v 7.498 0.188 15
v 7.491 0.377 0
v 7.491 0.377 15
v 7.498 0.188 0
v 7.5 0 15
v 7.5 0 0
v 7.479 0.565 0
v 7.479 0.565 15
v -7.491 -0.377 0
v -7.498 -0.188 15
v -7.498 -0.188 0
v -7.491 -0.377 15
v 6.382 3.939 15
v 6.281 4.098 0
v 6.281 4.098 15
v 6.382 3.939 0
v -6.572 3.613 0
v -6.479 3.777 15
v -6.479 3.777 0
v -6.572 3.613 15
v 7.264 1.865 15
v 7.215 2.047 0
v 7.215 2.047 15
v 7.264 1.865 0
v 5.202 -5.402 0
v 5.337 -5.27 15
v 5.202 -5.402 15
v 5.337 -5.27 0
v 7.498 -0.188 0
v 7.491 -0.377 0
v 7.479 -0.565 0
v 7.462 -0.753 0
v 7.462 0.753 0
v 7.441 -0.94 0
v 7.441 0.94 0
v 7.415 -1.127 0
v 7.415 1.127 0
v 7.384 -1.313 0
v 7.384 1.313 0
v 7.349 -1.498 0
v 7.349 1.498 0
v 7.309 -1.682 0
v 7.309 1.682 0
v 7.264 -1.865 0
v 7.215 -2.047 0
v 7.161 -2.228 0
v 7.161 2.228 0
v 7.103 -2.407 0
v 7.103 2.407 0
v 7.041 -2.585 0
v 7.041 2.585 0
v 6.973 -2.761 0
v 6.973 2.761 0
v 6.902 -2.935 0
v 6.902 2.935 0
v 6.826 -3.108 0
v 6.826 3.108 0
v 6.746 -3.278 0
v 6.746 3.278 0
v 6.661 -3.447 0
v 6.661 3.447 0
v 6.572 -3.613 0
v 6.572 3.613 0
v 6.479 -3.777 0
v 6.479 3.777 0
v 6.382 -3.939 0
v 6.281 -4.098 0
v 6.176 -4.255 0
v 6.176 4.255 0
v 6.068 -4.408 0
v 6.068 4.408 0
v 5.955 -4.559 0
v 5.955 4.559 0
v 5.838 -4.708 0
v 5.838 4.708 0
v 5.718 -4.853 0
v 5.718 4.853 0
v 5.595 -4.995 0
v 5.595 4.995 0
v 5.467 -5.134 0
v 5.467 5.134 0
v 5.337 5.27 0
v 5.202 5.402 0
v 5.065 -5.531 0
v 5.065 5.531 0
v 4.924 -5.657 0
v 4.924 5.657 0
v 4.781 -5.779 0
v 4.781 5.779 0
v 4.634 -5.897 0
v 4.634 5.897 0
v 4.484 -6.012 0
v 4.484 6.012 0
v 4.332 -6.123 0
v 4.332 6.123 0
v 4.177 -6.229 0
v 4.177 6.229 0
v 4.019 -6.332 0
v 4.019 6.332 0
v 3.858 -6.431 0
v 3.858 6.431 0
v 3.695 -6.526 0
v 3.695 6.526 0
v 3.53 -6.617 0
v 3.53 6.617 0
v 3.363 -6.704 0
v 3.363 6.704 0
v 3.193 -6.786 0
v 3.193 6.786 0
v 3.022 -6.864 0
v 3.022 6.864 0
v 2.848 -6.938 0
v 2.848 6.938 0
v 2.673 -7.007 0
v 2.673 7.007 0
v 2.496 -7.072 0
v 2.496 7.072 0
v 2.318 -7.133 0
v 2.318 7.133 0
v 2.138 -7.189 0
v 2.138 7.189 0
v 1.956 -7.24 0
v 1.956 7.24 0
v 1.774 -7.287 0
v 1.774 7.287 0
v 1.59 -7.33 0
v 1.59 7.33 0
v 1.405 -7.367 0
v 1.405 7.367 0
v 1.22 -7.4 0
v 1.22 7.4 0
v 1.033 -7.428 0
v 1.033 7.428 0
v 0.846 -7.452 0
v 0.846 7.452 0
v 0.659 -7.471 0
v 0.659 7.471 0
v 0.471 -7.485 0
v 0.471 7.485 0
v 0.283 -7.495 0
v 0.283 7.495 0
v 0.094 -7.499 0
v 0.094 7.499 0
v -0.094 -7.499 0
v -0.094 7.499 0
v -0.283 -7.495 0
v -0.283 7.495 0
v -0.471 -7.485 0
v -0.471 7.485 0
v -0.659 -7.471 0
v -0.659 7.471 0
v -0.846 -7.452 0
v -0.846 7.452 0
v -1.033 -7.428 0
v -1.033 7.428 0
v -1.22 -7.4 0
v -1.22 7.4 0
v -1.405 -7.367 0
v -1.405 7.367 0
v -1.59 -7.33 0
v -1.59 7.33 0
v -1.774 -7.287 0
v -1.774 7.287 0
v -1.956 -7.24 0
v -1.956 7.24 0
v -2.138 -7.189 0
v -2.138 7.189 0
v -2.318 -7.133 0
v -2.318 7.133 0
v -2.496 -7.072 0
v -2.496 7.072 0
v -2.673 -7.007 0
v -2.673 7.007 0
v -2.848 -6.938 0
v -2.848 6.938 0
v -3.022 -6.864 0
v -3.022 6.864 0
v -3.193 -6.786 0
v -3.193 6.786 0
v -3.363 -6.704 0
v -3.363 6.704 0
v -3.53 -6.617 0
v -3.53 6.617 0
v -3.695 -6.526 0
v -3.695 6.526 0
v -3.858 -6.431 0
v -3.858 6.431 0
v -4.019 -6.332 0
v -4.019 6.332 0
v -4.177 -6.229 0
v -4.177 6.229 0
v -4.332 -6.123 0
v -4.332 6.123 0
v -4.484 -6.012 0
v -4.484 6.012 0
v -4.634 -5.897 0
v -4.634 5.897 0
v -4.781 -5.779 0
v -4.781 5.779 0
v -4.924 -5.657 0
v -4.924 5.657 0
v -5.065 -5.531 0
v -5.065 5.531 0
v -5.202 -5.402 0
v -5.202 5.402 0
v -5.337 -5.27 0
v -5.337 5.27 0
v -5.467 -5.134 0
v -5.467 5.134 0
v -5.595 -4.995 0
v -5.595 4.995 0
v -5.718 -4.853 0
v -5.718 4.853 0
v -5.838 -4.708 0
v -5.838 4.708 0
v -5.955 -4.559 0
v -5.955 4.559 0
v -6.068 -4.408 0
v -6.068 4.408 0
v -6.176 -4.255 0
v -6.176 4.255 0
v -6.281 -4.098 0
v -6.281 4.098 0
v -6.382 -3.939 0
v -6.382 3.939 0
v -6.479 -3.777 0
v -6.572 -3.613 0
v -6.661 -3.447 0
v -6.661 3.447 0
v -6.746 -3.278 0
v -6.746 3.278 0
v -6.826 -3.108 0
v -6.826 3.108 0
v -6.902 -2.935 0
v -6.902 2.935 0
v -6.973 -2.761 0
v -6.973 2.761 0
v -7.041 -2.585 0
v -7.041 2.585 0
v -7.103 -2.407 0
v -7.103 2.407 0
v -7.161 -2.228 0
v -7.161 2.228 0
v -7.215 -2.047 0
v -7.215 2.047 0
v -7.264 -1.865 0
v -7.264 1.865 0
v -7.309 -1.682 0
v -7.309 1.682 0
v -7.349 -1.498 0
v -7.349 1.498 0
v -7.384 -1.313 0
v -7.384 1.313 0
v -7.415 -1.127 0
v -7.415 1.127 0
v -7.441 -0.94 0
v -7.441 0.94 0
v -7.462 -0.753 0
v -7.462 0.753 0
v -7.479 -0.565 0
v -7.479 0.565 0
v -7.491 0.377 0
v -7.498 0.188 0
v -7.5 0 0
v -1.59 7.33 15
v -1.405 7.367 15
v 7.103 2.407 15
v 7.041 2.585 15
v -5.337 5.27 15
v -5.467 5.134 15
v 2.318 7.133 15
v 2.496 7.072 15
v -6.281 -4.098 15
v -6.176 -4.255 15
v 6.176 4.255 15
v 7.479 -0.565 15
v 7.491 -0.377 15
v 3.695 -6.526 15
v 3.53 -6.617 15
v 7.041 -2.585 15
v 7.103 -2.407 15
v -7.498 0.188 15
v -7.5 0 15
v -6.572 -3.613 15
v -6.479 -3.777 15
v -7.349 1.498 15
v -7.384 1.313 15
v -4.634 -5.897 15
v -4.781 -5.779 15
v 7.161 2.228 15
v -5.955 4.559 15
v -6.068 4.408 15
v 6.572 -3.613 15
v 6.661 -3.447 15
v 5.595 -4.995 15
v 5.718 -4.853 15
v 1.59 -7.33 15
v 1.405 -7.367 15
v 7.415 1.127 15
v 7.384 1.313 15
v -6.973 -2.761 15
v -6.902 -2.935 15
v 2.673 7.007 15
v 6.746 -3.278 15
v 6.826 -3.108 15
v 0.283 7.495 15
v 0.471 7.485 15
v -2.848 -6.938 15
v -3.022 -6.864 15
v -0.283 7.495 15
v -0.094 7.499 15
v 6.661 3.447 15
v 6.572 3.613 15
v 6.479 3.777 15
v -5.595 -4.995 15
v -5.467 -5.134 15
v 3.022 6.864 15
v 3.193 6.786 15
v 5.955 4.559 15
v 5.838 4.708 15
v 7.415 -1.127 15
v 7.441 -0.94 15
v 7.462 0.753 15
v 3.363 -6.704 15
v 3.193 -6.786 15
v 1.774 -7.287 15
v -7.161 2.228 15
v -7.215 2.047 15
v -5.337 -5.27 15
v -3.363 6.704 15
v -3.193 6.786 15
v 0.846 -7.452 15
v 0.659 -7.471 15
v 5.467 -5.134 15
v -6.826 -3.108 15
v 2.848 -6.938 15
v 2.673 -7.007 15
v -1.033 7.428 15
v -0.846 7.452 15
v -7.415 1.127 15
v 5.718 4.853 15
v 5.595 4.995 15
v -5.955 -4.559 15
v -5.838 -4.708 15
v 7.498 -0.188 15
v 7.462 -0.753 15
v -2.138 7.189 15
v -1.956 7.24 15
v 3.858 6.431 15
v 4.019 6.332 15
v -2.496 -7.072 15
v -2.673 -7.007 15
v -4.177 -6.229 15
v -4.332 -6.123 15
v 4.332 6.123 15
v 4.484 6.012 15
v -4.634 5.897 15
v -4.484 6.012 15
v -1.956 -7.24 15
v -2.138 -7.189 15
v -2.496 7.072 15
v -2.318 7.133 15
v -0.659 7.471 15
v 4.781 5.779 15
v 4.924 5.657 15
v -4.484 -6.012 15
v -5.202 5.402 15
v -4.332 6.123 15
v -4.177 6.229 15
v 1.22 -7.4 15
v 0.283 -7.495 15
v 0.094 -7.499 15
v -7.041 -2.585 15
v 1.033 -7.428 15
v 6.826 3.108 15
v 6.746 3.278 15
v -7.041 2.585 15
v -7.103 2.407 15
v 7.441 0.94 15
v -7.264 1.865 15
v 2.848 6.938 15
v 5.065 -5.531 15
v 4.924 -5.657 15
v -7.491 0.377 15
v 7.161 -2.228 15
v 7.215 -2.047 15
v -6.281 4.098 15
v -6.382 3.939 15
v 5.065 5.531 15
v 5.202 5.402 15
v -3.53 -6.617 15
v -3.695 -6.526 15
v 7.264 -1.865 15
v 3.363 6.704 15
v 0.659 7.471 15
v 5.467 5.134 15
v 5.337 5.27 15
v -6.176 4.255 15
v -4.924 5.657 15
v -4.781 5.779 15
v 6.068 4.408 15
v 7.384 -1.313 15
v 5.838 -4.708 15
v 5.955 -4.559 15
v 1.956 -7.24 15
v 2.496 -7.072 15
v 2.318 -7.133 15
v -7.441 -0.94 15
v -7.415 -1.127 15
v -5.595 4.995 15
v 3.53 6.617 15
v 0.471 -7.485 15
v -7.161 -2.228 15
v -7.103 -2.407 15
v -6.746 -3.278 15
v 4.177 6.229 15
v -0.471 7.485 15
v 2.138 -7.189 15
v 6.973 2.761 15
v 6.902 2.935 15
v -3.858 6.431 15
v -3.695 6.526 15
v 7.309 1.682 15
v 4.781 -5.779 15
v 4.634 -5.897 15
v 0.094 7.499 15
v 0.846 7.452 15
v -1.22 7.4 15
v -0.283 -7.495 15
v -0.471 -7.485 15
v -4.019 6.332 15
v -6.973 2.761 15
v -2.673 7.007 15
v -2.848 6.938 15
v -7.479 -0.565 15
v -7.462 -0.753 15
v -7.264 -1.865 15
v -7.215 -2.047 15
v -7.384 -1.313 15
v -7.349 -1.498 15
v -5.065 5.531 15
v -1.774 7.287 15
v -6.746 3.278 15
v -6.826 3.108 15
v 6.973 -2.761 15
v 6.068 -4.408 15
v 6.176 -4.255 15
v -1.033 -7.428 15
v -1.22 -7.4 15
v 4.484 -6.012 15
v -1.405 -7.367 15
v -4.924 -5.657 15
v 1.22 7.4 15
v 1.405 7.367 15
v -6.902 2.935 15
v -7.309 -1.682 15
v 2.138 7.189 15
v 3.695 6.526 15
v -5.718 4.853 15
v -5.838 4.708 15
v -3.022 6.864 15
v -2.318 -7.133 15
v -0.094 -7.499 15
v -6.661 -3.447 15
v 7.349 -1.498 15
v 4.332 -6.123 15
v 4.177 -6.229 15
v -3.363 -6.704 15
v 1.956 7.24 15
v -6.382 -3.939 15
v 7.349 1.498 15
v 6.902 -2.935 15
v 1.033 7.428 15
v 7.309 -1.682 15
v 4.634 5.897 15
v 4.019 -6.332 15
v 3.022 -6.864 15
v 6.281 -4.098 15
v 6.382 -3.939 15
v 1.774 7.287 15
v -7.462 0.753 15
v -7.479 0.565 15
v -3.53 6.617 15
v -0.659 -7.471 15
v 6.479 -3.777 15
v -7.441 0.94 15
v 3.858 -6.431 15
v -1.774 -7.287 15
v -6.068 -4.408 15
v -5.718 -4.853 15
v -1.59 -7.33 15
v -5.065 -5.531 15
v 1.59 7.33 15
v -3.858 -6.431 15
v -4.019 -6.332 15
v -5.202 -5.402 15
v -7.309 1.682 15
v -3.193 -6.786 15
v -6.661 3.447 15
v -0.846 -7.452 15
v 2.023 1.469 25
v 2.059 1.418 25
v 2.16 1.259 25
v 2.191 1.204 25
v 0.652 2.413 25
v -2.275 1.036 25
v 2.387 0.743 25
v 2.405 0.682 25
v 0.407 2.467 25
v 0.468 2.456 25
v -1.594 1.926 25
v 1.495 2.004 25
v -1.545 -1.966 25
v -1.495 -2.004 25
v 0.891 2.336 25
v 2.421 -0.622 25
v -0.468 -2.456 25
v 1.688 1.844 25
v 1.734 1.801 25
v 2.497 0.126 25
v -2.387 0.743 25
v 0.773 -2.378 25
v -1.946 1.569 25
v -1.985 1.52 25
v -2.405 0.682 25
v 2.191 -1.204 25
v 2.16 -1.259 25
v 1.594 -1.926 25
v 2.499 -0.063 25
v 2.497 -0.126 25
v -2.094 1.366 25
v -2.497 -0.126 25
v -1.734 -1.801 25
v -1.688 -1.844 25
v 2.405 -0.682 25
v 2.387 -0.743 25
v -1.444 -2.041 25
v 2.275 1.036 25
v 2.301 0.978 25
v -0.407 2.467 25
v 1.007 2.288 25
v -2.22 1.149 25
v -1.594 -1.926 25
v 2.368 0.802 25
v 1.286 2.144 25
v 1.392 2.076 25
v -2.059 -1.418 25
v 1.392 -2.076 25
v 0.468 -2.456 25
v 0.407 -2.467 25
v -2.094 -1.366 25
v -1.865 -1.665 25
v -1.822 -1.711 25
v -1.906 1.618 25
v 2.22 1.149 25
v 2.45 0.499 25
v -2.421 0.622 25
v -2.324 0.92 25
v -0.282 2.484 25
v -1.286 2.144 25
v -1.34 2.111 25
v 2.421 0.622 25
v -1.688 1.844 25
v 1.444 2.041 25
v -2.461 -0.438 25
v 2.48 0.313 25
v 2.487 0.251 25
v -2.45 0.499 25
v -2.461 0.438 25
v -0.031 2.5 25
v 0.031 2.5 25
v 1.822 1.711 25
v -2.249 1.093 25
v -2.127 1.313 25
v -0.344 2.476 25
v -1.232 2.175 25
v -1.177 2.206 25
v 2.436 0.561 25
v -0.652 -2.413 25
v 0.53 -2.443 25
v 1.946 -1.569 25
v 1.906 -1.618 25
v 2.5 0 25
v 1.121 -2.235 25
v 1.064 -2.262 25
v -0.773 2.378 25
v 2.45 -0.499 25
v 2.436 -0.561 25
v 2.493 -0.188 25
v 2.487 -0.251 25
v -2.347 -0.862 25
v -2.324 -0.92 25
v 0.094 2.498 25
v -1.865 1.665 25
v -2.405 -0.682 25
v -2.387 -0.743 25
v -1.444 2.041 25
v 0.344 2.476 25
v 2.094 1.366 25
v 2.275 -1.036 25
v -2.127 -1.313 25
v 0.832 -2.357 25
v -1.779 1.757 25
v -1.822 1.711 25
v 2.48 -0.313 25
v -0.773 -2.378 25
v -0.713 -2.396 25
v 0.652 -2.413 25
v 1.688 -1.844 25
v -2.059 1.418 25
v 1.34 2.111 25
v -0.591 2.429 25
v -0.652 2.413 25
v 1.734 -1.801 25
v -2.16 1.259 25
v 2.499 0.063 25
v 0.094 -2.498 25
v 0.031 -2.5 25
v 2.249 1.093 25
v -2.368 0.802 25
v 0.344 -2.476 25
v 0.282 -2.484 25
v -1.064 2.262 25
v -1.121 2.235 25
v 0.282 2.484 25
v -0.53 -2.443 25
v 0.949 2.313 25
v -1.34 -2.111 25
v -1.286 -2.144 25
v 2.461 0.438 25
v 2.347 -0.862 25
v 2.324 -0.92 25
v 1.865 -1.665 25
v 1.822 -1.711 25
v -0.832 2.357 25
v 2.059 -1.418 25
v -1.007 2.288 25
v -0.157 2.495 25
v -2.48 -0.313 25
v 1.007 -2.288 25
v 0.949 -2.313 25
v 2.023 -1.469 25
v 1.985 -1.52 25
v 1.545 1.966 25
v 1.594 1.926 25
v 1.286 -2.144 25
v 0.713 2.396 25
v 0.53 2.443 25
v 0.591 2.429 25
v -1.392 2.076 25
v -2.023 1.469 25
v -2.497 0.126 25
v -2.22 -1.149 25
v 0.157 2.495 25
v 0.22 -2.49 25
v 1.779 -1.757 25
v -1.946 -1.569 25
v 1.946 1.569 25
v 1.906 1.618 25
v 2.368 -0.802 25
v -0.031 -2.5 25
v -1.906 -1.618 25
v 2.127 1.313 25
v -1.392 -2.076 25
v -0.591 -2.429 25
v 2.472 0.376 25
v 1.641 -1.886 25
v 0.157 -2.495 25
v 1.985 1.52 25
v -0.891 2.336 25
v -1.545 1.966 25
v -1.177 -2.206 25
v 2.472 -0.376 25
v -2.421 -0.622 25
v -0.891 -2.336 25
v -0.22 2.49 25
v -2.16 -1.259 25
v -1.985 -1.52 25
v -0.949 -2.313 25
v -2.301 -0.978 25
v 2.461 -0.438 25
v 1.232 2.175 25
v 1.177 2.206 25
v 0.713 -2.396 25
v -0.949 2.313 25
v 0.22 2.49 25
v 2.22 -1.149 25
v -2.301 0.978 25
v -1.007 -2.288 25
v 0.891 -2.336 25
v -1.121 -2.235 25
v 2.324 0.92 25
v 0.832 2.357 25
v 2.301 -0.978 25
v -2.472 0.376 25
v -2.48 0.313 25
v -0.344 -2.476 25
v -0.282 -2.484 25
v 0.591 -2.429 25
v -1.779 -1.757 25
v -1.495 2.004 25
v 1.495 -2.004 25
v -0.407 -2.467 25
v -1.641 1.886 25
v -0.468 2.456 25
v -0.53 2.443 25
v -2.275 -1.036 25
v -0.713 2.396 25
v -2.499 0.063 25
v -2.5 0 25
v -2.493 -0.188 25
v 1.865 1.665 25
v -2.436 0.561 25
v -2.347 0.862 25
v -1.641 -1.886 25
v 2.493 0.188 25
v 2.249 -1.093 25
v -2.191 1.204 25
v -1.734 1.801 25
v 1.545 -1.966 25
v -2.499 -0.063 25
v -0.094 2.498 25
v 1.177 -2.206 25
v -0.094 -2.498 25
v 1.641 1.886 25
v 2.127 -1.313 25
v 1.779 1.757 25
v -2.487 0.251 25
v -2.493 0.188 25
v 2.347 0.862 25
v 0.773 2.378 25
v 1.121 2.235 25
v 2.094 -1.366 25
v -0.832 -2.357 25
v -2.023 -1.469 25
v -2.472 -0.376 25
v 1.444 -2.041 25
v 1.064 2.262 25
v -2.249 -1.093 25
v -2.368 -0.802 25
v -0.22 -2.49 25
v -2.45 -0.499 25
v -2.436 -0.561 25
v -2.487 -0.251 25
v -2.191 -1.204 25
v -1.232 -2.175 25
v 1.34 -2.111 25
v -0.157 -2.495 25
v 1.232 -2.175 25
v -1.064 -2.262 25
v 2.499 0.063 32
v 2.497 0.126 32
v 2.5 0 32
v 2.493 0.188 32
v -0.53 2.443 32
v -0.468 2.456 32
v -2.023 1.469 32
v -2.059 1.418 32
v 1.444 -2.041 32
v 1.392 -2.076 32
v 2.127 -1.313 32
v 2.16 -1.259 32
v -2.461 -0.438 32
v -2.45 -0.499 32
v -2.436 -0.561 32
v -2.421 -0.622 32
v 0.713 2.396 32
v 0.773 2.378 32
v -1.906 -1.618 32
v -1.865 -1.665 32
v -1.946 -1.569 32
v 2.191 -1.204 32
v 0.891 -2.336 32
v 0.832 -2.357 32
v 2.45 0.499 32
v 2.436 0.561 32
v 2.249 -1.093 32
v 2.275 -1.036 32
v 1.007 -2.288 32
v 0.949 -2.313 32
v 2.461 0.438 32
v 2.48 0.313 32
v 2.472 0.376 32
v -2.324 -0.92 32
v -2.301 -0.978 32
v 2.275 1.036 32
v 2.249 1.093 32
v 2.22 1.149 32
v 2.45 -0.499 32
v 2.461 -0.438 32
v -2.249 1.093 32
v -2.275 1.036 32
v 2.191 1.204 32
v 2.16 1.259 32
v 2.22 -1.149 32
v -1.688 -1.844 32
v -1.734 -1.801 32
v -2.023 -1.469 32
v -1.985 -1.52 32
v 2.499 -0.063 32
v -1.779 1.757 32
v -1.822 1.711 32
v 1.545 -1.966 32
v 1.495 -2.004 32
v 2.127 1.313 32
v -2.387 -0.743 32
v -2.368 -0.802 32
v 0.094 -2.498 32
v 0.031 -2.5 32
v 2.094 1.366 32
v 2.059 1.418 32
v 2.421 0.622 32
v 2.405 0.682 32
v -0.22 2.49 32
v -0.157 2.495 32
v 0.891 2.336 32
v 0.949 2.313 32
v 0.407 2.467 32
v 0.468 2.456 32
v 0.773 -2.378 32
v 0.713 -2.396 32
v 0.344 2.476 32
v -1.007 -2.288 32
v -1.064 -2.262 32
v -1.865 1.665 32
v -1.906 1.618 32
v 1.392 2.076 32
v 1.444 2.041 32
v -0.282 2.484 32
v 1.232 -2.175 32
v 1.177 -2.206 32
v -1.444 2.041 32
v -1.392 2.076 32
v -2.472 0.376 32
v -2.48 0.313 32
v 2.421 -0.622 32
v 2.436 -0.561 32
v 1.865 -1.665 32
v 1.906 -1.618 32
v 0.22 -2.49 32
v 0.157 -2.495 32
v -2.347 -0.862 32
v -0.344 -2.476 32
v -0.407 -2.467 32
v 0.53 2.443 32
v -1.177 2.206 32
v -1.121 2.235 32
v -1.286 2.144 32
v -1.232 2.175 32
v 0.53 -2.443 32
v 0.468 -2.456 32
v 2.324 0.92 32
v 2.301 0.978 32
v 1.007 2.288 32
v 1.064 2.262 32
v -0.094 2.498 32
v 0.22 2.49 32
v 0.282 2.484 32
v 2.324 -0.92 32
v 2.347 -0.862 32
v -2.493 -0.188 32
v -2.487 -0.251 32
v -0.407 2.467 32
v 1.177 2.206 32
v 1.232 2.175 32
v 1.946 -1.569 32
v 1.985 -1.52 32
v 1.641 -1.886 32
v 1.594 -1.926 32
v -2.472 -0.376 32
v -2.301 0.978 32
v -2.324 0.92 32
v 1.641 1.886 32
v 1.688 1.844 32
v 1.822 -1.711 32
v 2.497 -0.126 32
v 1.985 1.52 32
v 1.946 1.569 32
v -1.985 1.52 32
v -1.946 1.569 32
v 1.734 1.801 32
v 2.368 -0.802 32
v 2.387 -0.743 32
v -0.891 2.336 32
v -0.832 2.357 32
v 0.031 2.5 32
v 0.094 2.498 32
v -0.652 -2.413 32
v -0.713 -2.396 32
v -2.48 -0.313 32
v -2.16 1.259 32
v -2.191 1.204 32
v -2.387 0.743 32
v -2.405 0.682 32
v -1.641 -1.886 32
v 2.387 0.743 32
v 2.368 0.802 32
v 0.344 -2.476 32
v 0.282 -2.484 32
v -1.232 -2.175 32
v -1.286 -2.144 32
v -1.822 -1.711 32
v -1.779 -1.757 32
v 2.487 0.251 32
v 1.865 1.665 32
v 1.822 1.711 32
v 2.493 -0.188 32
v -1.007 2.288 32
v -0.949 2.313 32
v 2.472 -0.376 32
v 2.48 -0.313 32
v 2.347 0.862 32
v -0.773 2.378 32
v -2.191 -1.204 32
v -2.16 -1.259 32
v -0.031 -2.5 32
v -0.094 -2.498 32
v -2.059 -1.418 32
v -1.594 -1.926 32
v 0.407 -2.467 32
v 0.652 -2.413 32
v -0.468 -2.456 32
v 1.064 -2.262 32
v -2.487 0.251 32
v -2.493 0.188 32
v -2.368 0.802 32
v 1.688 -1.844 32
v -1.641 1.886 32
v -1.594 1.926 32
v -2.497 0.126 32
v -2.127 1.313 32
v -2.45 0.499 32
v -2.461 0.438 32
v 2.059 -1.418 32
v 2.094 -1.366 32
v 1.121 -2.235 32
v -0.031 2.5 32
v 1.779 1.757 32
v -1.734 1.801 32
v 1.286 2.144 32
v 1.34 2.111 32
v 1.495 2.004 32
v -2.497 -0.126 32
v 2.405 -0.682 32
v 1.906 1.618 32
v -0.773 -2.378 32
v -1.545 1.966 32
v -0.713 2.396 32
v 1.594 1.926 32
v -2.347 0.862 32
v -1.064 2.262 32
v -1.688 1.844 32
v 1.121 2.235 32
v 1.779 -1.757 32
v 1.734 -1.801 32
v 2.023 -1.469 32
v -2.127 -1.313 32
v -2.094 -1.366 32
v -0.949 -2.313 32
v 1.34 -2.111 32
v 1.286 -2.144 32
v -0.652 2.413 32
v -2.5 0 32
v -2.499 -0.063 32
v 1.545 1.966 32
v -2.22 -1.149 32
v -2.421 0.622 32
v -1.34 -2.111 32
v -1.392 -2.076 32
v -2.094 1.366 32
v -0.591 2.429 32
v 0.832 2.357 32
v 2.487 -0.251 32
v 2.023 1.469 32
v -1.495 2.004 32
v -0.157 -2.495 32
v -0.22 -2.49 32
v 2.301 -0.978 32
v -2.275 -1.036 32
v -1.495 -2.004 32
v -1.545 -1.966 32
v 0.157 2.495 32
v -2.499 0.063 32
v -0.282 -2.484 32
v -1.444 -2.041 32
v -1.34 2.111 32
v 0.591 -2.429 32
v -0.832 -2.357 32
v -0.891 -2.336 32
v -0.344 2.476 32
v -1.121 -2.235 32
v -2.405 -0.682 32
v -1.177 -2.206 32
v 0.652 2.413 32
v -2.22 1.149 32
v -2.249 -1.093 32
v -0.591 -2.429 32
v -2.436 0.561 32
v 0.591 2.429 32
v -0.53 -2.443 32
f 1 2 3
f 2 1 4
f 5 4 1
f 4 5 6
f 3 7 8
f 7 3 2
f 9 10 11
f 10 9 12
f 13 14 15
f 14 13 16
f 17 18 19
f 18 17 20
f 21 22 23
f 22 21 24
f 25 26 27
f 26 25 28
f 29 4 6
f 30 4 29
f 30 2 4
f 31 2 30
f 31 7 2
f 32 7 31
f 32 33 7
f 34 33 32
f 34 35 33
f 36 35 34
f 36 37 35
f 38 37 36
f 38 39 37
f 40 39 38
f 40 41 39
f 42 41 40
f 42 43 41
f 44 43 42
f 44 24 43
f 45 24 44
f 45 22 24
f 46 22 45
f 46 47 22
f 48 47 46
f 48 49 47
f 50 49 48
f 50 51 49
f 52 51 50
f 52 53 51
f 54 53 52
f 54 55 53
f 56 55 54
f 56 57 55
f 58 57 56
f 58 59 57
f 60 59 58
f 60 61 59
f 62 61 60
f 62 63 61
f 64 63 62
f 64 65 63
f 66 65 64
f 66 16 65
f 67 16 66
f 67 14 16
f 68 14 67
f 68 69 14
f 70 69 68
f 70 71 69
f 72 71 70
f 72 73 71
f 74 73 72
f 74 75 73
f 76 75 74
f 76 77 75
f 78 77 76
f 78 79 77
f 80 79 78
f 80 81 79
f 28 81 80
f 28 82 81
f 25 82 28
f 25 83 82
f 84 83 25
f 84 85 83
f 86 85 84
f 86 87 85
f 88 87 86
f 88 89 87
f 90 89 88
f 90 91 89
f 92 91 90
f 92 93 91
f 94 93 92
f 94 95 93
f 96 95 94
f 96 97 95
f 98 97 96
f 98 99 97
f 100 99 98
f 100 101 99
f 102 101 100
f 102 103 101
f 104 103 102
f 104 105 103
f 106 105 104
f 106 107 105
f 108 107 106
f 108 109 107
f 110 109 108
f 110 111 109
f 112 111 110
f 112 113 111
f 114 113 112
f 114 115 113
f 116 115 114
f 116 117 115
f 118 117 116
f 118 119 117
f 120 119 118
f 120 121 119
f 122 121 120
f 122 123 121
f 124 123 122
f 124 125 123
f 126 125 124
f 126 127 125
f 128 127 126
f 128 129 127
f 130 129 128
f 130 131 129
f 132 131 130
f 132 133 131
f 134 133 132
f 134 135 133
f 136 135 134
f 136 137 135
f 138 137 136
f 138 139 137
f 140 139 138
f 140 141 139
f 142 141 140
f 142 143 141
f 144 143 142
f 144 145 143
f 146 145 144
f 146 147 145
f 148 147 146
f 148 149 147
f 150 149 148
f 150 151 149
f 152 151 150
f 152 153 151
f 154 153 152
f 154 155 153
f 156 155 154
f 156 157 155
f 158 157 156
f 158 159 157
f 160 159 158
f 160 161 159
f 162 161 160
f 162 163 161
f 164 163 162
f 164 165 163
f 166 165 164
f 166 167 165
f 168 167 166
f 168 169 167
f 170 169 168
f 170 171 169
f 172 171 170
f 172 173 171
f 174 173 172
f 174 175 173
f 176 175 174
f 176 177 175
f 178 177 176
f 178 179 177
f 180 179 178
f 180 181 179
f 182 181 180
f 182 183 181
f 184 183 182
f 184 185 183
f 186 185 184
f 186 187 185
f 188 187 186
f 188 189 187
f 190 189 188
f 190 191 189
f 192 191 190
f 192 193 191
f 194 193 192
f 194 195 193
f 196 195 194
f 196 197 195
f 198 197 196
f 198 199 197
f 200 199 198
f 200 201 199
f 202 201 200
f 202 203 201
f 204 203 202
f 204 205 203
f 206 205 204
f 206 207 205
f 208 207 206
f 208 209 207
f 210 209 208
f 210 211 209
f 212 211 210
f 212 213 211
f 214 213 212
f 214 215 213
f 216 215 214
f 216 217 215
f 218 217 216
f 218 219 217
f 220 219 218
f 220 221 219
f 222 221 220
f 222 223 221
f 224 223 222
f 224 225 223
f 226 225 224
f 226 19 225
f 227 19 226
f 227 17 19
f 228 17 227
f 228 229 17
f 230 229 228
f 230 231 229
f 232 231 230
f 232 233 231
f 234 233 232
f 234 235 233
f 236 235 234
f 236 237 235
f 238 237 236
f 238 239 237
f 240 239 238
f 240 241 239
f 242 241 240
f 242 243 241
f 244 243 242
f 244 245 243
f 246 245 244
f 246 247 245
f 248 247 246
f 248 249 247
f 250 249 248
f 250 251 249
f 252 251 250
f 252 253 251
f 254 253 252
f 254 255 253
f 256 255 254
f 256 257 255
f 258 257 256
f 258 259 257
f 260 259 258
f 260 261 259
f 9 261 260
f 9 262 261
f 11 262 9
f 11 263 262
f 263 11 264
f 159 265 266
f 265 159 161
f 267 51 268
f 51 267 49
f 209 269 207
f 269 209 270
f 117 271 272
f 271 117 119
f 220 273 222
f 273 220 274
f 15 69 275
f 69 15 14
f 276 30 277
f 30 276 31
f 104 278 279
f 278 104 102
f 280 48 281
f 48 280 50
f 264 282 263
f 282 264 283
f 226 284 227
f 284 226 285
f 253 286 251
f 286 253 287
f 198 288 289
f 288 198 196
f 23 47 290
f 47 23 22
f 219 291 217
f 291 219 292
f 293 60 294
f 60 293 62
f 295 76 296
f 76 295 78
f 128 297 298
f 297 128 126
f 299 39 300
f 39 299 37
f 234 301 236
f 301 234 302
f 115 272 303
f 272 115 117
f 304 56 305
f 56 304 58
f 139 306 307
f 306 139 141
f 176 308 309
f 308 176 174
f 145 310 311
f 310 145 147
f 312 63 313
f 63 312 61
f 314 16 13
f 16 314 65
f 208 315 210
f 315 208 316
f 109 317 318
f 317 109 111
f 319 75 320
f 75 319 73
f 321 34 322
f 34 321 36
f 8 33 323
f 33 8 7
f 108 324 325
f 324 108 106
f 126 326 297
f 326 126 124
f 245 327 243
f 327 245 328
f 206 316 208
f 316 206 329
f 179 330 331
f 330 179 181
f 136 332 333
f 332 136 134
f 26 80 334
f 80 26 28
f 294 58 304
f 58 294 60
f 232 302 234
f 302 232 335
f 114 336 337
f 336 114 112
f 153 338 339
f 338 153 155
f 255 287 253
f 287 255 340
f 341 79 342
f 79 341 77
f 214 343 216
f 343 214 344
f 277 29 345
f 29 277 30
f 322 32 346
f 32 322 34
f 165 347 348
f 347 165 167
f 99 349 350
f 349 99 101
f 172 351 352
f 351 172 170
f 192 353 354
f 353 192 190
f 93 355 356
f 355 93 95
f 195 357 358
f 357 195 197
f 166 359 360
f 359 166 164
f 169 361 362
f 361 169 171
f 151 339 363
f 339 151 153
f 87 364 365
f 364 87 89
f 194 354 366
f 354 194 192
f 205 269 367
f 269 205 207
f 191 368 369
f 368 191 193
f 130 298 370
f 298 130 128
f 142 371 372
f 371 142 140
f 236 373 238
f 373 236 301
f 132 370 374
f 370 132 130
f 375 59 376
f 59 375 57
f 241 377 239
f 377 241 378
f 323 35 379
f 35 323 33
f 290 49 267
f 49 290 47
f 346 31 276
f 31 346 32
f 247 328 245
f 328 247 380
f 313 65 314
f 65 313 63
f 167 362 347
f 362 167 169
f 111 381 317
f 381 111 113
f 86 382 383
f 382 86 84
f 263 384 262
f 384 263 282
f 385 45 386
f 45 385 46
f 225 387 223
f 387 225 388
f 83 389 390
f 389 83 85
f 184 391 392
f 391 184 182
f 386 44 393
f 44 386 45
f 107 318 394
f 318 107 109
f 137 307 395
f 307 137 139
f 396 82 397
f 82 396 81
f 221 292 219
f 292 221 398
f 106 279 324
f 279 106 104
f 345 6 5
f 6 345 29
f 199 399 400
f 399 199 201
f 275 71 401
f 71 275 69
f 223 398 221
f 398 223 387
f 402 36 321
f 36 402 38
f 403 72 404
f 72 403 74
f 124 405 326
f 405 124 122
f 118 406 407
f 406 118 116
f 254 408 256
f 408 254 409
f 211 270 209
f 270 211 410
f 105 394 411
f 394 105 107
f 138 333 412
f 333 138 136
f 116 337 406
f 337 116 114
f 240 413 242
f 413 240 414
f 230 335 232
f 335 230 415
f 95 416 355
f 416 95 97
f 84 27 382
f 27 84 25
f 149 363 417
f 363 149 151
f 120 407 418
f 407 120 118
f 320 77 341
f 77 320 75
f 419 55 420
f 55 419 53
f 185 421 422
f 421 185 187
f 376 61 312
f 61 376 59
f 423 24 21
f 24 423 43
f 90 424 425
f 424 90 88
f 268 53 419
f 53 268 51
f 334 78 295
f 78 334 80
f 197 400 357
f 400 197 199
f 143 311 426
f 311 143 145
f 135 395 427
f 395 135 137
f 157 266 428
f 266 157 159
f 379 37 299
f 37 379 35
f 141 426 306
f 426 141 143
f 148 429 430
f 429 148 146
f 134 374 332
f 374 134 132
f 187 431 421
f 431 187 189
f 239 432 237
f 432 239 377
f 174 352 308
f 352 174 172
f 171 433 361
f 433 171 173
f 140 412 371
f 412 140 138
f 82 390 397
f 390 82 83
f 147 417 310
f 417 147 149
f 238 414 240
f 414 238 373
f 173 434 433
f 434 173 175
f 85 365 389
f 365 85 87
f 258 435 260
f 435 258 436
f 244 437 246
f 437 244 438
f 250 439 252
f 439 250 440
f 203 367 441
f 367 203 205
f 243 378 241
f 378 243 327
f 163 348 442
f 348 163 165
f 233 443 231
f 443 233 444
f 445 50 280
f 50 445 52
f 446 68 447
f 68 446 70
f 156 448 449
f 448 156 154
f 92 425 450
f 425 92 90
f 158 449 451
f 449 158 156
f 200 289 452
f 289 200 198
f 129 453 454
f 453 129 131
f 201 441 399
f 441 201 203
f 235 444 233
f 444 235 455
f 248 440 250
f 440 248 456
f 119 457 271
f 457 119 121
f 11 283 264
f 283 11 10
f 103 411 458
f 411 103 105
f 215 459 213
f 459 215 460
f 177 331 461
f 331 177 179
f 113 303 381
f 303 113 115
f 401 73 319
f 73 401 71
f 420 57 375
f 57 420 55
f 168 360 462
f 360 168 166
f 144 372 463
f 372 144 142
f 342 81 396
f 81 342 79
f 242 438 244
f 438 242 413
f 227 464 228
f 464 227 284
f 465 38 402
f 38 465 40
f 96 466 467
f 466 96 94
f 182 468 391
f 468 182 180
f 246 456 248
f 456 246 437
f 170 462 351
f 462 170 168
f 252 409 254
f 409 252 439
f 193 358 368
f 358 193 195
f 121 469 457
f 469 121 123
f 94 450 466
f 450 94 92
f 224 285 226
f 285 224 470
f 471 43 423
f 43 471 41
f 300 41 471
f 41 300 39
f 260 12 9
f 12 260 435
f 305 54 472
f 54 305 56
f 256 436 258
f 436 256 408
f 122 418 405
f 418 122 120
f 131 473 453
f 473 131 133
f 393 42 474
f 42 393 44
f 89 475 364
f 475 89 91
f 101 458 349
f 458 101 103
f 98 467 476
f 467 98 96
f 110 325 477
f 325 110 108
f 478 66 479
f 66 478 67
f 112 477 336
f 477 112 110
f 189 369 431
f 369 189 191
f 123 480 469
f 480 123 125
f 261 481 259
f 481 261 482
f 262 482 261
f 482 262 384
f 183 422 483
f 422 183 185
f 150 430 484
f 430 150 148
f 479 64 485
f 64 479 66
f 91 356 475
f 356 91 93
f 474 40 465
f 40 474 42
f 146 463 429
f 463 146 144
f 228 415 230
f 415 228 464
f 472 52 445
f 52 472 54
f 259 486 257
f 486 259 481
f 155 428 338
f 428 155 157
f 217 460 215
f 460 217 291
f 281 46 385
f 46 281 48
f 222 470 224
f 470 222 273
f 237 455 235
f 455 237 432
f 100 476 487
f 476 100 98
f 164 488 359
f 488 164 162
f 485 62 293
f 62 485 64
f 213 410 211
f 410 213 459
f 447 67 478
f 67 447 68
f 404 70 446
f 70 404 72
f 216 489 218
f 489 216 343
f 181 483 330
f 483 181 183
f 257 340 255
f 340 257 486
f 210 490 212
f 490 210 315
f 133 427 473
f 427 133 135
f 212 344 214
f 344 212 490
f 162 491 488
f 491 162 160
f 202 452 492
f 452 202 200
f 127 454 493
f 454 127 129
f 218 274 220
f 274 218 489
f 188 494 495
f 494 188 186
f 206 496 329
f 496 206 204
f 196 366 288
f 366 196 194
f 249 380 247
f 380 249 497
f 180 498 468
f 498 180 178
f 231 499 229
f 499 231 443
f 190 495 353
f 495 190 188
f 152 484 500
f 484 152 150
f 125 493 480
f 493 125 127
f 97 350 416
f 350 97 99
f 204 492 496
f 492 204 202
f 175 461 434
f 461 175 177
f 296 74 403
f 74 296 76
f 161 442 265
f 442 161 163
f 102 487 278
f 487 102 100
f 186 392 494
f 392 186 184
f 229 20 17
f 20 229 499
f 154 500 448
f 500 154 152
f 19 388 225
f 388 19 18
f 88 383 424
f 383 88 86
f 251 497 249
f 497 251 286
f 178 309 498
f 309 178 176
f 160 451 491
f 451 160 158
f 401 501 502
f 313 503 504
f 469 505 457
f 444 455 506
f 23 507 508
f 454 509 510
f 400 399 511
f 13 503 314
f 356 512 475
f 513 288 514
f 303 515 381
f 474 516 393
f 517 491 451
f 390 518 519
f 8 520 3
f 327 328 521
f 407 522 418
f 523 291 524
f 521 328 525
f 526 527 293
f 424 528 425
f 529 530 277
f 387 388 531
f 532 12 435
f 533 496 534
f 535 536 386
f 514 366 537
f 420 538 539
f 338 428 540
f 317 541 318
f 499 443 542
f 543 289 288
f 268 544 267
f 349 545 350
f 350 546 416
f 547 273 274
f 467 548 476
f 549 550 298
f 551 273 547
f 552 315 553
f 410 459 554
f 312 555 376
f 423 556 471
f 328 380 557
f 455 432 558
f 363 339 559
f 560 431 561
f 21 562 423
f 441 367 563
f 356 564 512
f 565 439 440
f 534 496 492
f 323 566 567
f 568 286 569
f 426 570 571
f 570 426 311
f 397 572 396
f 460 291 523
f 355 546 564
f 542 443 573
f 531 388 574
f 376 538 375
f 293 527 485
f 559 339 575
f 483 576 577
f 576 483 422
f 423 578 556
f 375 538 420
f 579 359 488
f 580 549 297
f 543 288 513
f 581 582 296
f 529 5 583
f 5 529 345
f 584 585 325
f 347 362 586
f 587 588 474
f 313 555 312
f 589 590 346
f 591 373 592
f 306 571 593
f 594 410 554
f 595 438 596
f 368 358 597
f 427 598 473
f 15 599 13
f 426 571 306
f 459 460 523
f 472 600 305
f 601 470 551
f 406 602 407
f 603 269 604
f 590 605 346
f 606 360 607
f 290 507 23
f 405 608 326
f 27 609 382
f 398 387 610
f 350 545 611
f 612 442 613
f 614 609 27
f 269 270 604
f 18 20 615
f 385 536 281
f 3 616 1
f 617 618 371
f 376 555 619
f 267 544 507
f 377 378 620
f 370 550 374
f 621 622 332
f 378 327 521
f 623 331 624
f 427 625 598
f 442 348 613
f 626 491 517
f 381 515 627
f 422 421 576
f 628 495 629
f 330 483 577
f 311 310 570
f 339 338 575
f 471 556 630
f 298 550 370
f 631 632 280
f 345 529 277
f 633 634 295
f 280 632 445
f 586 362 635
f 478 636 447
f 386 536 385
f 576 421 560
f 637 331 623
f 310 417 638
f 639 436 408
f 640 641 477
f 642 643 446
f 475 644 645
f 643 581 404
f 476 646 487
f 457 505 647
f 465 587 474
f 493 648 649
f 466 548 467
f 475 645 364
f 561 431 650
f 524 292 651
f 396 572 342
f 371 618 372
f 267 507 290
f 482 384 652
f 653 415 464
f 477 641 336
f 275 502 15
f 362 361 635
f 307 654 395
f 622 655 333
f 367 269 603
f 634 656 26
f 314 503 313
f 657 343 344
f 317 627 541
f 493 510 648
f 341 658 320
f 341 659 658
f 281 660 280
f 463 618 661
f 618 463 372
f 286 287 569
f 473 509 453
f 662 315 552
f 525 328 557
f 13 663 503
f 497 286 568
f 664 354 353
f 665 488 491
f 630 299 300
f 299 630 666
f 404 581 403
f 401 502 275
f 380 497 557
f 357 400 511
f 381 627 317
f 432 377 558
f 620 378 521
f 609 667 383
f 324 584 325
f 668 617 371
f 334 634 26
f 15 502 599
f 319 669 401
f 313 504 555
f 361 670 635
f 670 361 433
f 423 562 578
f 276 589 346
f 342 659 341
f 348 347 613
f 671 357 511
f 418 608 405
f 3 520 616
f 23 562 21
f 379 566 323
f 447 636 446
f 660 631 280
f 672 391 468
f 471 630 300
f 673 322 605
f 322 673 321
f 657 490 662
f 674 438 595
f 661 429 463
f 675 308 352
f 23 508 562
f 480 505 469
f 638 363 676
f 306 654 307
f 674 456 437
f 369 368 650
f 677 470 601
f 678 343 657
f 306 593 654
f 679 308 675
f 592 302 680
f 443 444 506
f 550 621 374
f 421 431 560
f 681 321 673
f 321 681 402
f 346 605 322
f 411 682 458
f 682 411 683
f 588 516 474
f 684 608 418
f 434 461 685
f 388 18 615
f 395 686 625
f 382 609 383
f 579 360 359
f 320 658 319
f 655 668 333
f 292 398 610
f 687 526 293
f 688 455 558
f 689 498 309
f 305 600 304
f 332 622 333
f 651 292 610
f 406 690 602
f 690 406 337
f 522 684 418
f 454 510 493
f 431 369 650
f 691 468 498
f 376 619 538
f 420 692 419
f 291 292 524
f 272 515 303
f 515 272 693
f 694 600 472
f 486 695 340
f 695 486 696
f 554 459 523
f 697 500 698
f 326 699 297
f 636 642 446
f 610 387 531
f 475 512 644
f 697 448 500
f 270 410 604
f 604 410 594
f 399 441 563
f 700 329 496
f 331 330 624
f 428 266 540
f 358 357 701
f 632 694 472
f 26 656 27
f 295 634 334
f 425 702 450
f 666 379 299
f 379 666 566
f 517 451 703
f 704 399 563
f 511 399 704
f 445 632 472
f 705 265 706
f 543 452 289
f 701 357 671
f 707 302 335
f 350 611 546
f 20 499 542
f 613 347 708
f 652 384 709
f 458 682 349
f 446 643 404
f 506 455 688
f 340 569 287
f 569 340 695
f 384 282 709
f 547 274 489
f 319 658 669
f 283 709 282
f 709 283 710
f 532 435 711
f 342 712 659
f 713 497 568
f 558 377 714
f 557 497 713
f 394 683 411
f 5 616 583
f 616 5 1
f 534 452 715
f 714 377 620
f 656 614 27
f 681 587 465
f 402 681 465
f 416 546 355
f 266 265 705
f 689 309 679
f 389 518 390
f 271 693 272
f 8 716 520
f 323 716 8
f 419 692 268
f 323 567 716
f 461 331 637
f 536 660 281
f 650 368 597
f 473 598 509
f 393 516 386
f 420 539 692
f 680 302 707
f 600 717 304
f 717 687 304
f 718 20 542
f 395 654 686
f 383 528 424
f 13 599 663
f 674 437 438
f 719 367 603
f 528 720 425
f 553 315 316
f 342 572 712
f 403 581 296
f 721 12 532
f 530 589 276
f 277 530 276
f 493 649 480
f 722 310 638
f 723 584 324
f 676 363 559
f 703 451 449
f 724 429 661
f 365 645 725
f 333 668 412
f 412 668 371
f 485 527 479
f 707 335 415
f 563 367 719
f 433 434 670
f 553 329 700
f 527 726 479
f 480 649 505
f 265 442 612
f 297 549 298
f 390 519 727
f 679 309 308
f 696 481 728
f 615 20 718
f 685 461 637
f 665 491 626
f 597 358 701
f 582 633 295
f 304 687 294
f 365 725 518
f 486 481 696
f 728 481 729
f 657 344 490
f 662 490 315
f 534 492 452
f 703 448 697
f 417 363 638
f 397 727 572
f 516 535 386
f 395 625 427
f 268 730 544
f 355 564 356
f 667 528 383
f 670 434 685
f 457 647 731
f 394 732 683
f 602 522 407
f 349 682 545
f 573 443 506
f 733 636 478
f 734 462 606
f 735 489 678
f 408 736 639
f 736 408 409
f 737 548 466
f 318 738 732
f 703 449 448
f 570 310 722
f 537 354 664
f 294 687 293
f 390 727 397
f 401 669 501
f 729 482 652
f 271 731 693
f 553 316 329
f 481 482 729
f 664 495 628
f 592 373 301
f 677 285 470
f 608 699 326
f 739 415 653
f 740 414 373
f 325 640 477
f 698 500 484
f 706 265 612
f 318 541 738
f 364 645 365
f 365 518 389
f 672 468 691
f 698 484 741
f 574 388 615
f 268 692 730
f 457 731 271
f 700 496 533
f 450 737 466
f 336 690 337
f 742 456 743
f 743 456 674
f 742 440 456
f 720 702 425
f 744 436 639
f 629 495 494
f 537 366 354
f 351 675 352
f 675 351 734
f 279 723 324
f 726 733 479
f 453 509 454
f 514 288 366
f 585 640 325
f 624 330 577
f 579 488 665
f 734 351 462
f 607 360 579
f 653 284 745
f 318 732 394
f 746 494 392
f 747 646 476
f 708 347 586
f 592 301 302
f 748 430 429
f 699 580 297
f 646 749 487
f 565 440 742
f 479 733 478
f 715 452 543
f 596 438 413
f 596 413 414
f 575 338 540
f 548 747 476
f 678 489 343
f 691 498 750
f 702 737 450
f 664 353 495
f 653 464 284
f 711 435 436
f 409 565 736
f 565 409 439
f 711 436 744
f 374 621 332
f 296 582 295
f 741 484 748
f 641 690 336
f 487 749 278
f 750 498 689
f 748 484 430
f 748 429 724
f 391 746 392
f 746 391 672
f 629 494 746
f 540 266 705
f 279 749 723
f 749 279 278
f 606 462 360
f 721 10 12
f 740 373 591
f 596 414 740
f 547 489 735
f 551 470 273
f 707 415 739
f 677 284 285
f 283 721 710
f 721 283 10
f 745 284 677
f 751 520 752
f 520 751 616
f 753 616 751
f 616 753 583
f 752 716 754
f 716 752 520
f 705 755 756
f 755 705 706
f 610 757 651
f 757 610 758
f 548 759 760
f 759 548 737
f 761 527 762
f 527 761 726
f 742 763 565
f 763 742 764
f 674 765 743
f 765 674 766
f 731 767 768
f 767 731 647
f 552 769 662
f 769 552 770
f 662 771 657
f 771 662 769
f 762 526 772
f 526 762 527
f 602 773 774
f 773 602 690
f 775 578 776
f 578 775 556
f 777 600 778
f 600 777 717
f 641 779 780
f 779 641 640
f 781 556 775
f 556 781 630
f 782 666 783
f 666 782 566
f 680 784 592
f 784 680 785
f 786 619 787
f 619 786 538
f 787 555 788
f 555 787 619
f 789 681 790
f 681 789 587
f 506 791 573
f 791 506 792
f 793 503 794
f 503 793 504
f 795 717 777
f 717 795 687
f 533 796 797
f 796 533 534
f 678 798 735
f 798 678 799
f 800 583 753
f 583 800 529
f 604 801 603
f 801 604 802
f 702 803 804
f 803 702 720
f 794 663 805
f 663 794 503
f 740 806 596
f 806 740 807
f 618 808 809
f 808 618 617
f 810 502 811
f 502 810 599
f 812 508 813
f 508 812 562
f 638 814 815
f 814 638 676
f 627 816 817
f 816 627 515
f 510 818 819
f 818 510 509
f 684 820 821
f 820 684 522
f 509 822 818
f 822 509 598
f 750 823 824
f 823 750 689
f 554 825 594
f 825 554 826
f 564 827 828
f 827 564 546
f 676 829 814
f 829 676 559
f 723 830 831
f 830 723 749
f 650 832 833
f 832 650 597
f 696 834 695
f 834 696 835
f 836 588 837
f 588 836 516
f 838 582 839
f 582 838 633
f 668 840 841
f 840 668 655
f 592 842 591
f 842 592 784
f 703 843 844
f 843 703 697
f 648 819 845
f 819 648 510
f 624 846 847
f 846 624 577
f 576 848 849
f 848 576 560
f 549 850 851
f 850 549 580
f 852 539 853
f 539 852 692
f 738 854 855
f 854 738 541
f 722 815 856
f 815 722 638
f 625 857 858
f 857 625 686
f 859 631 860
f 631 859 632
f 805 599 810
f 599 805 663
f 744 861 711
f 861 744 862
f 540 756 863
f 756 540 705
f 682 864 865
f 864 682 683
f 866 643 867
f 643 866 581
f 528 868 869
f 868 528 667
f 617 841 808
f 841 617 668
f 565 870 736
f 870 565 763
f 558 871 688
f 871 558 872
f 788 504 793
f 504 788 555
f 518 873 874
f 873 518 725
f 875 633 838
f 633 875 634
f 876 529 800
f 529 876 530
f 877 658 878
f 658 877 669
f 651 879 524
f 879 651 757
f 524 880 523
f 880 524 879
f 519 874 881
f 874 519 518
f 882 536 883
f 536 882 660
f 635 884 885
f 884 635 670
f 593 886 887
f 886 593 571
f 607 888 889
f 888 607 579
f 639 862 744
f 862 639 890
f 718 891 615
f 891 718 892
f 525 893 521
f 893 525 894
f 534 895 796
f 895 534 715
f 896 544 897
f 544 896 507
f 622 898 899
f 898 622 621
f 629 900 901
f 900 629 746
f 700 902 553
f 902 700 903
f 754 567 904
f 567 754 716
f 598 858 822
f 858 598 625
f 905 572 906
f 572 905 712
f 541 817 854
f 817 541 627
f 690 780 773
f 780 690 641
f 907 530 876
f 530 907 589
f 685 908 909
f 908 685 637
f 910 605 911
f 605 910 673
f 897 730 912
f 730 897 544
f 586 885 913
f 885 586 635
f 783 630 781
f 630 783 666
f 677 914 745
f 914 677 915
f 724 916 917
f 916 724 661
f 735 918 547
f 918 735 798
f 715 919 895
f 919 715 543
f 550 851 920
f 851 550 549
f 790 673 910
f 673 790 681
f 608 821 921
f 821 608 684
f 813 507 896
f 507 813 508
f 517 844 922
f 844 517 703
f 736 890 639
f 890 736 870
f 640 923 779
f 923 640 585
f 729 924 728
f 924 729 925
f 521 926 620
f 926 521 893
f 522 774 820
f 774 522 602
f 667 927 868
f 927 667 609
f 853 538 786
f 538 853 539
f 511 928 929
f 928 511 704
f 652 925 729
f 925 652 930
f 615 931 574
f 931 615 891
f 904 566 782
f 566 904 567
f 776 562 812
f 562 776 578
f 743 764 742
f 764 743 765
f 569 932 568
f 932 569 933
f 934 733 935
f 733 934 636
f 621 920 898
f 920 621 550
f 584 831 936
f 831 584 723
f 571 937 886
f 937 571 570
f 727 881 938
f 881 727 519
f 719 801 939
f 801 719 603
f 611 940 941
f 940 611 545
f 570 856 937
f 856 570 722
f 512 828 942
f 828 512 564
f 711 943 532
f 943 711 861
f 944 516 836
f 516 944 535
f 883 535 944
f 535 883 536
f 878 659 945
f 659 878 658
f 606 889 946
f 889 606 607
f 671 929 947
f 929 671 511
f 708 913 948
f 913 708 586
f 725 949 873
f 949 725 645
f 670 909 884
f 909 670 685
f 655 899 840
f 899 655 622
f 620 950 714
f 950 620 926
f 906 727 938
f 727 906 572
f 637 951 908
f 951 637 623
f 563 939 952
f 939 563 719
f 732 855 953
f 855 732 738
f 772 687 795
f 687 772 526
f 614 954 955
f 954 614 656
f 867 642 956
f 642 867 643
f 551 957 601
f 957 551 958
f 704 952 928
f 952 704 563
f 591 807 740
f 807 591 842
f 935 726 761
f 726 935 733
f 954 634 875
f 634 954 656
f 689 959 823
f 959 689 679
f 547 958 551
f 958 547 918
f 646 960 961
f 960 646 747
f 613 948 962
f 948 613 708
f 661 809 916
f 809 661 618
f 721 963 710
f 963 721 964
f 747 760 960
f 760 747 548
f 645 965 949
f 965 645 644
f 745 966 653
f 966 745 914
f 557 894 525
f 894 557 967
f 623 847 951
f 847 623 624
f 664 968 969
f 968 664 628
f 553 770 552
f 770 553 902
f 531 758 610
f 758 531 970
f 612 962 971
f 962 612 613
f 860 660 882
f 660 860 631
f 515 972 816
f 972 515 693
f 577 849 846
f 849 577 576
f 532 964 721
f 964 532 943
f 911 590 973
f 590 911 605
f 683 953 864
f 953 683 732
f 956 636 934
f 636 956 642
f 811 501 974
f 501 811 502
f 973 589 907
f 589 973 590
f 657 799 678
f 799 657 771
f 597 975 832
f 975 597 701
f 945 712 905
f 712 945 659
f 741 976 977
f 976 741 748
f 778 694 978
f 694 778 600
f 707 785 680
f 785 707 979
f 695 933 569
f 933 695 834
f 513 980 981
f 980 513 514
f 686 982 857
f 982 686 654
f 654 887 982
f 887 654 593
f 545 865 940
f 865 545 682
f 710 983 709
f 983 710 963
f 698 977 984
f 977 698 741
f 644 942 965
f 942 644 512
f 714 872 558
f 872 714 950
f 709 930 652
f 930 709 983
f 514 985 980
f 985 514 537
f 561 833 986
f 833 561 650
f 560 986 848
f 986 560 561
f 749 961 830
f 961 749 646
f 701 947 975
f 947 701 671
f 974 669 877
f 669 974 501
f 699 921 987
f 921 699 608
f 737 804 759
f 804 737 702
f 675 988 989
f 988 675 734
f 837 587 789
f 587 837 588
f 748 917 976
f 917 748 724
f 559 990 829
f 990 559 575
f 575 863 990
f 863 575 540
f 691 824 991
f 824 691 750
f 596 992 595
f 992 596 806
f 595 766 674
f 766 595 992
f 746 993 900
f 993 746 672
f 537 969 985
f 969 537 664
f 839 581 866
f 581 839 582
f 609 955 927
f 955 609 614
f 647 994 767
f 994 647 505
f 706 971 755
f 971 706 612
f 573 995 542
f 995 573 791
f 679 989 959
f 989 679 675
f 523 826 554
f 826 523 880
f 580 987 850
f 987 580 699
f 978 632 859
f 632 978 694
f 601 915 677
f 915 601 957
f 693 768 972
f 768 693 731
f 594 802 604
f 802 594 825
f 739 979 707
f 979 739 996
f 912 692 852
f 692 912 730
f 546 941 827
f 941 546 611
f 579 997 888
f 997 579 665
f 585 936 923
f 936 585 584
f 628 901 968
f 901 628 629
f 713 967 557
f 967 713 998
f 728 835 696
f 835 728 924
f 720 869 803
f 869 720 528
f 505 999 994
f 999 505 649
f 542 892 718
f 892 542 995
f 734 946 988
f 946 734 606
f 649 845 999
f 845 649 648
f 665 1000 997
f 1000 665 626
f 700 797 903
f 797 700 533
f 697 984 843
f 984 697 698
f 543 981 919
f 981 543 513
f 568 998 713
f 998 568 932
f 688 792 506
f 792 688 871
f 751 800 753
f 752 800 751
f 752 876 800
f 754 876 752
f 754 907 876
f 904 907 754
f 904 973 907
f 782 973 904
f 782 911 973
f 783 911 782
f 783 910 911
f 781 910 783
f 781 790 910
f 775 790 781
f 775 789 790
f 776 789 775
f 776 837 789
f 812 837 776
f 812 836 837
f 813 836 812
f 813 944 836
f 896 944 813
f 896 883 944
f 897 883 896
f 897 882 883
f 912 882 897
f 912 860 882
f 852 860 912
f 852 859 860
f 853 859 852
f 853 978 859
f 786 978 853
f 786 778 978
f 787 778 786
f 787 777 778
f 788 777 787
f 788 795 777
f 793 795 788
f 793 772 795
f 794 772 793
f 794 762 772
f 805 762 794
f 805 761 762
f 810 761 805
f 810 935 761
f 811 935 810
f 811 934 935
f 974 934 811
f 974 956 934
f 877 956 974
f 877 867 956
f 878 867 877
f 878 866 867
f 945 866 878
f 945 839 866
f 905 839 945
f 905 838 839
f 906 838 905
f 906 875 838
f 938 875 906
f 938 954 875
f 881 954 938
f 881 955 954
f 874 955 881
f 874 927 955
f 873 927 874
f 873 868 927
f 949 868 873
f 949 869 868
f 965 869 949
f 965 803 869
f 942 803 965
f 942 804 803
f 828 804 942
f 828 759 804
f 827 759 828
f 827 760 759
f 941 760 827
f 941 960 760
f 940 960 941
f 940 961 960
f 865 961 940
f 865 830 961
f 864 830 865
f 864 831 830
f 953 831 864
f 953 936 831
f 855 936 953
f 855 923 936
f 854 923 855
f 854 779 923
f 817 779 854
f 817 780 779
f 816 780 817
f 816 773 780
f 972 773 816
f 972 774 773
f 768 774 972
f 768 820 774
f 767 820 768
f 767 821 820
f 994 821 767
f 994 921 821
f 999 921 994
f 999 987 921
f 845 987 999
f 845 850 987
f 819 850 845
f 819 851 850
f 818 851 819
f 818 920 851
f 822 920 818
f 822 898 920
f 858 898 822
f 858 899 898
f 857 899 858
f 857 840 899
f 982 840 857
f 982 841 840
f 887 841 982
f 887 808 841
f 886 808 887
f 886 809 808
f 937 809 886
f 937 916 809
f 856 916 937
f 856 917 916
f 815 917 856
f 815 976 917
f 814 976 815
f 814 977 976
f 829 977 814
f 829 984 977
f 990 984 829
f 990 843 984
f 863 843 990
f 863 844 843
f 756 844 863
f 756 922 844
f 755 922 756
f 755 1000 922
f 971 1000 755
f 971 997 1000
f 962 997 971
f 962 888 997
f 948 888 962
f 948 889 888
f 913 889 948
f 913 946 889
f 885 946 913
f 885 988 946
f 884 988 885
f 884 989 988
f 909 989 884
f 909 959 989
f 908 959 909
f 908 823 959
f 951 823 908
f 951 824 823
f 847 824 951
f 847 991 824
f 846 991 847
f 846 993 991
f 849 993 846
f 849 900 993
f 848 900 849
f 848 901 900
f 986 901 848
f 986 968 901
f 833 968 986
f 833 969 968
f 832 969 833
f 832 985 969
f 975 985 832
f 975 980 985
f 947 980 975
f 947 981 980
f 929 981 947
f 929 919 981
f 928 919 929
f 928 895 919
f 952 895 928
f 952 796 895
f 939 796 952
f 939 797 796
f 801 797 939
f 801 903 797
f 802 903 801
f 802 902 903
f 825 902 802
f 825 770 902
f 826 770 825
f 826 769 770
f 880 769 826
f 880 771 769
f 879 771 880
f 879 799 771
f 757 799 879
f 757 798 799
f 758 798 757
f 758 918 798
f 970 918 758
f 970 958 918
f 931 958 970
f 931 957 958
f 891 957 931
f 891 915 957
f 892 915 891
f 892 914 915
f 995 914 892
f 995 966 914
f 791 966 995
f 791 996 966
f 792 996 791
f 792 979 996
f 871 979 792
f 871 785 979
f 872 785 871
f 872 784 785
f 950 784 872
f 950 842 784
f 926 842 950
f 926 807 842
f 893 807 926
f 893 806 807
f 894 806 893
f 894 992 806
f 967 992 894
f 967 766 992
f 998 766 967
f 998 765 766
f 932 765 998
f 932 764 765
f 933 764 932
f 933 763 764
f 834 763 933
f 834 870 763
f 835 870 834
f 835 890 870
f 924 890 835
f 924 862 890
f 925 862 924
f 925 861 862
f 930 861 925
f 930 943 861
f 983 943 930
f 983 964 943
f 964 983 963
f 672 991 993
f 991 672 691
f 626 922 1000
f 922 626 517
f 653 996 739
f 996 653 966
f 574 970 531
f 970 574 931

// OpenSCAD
$fn=250;

cylinder(h=15, d=15);
translate([0,0,15]) cylinder(h=10, d1=15, d2=5);
translate([0,0,25]) cylinder(h=7, d=5);
